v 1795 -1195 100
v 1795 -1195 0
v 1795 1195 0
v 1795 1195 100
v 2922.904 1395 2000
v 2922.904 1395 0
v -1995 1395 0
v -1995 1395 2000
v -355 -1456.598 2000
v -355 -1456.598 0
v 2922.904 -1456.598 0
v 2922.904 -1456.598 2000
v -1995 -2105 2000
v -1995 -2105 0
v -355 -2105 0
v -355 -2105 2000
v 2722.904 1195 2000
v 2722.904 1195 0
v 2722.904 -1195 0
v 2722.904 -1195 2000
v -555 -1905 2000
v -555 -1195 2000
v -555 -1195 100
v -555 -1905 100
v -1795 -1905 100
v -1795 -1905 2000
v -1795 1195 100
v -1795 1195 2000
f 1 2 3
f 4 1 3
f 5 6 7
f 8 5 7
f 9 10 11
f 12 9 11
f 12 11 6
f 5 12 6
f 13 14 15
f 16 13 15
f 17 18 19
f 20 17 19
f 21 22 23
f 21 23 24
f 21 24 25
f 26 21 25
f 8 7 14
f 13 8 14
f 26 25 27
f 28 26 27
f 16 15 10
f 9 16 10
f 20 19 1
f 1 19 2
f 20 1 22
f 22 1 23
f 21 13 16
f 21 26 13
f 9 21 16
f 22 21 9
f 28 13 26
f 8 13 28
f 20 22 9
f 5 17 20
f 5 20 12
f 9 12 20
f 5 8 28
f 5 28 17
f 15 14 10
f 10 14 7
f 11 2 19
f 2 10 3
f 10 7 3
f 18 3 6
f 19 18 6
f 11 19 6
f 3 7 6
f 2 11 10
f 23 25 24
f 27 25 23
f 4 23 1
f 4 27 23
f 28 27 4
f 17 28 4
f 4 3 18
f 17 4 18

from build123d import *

# Parameters (mm, degrees)
F1_DEPTH = 2000
F2_DEPTH = 2000
F0_W     = 1240
F0_H     = 710
F3_DEPTH = 100


with BuildPart() as f1:
    # F0 (on Top) → F1 (new body)
    with BuildSketch(Plane.XY):
        Polygon((-1795, -1195), (-1795, 1195), (-1995, 1195), (-1995, -1905), (-1795, -1905), align=None)
    extrude(amount=F1_DEPTH)

    # F0 (on Top) → F2 (join)
    with BuildSketch(Plane.XY):
        Polygon((-555, -1905), (-1795, -1905), (-1995, -1905), (-1995, -2105), (-555, -2105), align=None)
        Polygon((-355, -1195), (-555, -1195), (-555, -1905), (-555, -2105), (-355, -2105), (-355, -1456.598401), align=None)
        Polygon((2722.903538, -1195), (1795, -1195), (-355, -1195), (-355, -1456.598401), (2722.903538, -1456.598401), align=None)
        Polygon((2922.903538, 1195), (2722.903538, 1195), (2722.903538, -1195), (2722.903538, -1456.598401), (2922.903538, -1456.598401), align=None)
        Polygon((-1995, 1195), (-1795, 1195), (1795, 1195), (2722.903538, 1195), (2922.903538, 1195), (2922.903538, 1395), (-1995, 1395), align=None)
    extrude(amount=F2_DEPTH)

    # F0 (on Top) → F3 (join)
    with BuildSketch(Plane.XY):
        with Locations((-1175, -1550)):
            Rectangle(F0_W, F0_H)
        Polygon((1795, 1195), (-1795, 1195), (-1795, -1195), (-555, -1195), (-355, -1195), (1795, -1195), align=None)
    extrude(amount=F3_DEPTH)


solid = f1.part
